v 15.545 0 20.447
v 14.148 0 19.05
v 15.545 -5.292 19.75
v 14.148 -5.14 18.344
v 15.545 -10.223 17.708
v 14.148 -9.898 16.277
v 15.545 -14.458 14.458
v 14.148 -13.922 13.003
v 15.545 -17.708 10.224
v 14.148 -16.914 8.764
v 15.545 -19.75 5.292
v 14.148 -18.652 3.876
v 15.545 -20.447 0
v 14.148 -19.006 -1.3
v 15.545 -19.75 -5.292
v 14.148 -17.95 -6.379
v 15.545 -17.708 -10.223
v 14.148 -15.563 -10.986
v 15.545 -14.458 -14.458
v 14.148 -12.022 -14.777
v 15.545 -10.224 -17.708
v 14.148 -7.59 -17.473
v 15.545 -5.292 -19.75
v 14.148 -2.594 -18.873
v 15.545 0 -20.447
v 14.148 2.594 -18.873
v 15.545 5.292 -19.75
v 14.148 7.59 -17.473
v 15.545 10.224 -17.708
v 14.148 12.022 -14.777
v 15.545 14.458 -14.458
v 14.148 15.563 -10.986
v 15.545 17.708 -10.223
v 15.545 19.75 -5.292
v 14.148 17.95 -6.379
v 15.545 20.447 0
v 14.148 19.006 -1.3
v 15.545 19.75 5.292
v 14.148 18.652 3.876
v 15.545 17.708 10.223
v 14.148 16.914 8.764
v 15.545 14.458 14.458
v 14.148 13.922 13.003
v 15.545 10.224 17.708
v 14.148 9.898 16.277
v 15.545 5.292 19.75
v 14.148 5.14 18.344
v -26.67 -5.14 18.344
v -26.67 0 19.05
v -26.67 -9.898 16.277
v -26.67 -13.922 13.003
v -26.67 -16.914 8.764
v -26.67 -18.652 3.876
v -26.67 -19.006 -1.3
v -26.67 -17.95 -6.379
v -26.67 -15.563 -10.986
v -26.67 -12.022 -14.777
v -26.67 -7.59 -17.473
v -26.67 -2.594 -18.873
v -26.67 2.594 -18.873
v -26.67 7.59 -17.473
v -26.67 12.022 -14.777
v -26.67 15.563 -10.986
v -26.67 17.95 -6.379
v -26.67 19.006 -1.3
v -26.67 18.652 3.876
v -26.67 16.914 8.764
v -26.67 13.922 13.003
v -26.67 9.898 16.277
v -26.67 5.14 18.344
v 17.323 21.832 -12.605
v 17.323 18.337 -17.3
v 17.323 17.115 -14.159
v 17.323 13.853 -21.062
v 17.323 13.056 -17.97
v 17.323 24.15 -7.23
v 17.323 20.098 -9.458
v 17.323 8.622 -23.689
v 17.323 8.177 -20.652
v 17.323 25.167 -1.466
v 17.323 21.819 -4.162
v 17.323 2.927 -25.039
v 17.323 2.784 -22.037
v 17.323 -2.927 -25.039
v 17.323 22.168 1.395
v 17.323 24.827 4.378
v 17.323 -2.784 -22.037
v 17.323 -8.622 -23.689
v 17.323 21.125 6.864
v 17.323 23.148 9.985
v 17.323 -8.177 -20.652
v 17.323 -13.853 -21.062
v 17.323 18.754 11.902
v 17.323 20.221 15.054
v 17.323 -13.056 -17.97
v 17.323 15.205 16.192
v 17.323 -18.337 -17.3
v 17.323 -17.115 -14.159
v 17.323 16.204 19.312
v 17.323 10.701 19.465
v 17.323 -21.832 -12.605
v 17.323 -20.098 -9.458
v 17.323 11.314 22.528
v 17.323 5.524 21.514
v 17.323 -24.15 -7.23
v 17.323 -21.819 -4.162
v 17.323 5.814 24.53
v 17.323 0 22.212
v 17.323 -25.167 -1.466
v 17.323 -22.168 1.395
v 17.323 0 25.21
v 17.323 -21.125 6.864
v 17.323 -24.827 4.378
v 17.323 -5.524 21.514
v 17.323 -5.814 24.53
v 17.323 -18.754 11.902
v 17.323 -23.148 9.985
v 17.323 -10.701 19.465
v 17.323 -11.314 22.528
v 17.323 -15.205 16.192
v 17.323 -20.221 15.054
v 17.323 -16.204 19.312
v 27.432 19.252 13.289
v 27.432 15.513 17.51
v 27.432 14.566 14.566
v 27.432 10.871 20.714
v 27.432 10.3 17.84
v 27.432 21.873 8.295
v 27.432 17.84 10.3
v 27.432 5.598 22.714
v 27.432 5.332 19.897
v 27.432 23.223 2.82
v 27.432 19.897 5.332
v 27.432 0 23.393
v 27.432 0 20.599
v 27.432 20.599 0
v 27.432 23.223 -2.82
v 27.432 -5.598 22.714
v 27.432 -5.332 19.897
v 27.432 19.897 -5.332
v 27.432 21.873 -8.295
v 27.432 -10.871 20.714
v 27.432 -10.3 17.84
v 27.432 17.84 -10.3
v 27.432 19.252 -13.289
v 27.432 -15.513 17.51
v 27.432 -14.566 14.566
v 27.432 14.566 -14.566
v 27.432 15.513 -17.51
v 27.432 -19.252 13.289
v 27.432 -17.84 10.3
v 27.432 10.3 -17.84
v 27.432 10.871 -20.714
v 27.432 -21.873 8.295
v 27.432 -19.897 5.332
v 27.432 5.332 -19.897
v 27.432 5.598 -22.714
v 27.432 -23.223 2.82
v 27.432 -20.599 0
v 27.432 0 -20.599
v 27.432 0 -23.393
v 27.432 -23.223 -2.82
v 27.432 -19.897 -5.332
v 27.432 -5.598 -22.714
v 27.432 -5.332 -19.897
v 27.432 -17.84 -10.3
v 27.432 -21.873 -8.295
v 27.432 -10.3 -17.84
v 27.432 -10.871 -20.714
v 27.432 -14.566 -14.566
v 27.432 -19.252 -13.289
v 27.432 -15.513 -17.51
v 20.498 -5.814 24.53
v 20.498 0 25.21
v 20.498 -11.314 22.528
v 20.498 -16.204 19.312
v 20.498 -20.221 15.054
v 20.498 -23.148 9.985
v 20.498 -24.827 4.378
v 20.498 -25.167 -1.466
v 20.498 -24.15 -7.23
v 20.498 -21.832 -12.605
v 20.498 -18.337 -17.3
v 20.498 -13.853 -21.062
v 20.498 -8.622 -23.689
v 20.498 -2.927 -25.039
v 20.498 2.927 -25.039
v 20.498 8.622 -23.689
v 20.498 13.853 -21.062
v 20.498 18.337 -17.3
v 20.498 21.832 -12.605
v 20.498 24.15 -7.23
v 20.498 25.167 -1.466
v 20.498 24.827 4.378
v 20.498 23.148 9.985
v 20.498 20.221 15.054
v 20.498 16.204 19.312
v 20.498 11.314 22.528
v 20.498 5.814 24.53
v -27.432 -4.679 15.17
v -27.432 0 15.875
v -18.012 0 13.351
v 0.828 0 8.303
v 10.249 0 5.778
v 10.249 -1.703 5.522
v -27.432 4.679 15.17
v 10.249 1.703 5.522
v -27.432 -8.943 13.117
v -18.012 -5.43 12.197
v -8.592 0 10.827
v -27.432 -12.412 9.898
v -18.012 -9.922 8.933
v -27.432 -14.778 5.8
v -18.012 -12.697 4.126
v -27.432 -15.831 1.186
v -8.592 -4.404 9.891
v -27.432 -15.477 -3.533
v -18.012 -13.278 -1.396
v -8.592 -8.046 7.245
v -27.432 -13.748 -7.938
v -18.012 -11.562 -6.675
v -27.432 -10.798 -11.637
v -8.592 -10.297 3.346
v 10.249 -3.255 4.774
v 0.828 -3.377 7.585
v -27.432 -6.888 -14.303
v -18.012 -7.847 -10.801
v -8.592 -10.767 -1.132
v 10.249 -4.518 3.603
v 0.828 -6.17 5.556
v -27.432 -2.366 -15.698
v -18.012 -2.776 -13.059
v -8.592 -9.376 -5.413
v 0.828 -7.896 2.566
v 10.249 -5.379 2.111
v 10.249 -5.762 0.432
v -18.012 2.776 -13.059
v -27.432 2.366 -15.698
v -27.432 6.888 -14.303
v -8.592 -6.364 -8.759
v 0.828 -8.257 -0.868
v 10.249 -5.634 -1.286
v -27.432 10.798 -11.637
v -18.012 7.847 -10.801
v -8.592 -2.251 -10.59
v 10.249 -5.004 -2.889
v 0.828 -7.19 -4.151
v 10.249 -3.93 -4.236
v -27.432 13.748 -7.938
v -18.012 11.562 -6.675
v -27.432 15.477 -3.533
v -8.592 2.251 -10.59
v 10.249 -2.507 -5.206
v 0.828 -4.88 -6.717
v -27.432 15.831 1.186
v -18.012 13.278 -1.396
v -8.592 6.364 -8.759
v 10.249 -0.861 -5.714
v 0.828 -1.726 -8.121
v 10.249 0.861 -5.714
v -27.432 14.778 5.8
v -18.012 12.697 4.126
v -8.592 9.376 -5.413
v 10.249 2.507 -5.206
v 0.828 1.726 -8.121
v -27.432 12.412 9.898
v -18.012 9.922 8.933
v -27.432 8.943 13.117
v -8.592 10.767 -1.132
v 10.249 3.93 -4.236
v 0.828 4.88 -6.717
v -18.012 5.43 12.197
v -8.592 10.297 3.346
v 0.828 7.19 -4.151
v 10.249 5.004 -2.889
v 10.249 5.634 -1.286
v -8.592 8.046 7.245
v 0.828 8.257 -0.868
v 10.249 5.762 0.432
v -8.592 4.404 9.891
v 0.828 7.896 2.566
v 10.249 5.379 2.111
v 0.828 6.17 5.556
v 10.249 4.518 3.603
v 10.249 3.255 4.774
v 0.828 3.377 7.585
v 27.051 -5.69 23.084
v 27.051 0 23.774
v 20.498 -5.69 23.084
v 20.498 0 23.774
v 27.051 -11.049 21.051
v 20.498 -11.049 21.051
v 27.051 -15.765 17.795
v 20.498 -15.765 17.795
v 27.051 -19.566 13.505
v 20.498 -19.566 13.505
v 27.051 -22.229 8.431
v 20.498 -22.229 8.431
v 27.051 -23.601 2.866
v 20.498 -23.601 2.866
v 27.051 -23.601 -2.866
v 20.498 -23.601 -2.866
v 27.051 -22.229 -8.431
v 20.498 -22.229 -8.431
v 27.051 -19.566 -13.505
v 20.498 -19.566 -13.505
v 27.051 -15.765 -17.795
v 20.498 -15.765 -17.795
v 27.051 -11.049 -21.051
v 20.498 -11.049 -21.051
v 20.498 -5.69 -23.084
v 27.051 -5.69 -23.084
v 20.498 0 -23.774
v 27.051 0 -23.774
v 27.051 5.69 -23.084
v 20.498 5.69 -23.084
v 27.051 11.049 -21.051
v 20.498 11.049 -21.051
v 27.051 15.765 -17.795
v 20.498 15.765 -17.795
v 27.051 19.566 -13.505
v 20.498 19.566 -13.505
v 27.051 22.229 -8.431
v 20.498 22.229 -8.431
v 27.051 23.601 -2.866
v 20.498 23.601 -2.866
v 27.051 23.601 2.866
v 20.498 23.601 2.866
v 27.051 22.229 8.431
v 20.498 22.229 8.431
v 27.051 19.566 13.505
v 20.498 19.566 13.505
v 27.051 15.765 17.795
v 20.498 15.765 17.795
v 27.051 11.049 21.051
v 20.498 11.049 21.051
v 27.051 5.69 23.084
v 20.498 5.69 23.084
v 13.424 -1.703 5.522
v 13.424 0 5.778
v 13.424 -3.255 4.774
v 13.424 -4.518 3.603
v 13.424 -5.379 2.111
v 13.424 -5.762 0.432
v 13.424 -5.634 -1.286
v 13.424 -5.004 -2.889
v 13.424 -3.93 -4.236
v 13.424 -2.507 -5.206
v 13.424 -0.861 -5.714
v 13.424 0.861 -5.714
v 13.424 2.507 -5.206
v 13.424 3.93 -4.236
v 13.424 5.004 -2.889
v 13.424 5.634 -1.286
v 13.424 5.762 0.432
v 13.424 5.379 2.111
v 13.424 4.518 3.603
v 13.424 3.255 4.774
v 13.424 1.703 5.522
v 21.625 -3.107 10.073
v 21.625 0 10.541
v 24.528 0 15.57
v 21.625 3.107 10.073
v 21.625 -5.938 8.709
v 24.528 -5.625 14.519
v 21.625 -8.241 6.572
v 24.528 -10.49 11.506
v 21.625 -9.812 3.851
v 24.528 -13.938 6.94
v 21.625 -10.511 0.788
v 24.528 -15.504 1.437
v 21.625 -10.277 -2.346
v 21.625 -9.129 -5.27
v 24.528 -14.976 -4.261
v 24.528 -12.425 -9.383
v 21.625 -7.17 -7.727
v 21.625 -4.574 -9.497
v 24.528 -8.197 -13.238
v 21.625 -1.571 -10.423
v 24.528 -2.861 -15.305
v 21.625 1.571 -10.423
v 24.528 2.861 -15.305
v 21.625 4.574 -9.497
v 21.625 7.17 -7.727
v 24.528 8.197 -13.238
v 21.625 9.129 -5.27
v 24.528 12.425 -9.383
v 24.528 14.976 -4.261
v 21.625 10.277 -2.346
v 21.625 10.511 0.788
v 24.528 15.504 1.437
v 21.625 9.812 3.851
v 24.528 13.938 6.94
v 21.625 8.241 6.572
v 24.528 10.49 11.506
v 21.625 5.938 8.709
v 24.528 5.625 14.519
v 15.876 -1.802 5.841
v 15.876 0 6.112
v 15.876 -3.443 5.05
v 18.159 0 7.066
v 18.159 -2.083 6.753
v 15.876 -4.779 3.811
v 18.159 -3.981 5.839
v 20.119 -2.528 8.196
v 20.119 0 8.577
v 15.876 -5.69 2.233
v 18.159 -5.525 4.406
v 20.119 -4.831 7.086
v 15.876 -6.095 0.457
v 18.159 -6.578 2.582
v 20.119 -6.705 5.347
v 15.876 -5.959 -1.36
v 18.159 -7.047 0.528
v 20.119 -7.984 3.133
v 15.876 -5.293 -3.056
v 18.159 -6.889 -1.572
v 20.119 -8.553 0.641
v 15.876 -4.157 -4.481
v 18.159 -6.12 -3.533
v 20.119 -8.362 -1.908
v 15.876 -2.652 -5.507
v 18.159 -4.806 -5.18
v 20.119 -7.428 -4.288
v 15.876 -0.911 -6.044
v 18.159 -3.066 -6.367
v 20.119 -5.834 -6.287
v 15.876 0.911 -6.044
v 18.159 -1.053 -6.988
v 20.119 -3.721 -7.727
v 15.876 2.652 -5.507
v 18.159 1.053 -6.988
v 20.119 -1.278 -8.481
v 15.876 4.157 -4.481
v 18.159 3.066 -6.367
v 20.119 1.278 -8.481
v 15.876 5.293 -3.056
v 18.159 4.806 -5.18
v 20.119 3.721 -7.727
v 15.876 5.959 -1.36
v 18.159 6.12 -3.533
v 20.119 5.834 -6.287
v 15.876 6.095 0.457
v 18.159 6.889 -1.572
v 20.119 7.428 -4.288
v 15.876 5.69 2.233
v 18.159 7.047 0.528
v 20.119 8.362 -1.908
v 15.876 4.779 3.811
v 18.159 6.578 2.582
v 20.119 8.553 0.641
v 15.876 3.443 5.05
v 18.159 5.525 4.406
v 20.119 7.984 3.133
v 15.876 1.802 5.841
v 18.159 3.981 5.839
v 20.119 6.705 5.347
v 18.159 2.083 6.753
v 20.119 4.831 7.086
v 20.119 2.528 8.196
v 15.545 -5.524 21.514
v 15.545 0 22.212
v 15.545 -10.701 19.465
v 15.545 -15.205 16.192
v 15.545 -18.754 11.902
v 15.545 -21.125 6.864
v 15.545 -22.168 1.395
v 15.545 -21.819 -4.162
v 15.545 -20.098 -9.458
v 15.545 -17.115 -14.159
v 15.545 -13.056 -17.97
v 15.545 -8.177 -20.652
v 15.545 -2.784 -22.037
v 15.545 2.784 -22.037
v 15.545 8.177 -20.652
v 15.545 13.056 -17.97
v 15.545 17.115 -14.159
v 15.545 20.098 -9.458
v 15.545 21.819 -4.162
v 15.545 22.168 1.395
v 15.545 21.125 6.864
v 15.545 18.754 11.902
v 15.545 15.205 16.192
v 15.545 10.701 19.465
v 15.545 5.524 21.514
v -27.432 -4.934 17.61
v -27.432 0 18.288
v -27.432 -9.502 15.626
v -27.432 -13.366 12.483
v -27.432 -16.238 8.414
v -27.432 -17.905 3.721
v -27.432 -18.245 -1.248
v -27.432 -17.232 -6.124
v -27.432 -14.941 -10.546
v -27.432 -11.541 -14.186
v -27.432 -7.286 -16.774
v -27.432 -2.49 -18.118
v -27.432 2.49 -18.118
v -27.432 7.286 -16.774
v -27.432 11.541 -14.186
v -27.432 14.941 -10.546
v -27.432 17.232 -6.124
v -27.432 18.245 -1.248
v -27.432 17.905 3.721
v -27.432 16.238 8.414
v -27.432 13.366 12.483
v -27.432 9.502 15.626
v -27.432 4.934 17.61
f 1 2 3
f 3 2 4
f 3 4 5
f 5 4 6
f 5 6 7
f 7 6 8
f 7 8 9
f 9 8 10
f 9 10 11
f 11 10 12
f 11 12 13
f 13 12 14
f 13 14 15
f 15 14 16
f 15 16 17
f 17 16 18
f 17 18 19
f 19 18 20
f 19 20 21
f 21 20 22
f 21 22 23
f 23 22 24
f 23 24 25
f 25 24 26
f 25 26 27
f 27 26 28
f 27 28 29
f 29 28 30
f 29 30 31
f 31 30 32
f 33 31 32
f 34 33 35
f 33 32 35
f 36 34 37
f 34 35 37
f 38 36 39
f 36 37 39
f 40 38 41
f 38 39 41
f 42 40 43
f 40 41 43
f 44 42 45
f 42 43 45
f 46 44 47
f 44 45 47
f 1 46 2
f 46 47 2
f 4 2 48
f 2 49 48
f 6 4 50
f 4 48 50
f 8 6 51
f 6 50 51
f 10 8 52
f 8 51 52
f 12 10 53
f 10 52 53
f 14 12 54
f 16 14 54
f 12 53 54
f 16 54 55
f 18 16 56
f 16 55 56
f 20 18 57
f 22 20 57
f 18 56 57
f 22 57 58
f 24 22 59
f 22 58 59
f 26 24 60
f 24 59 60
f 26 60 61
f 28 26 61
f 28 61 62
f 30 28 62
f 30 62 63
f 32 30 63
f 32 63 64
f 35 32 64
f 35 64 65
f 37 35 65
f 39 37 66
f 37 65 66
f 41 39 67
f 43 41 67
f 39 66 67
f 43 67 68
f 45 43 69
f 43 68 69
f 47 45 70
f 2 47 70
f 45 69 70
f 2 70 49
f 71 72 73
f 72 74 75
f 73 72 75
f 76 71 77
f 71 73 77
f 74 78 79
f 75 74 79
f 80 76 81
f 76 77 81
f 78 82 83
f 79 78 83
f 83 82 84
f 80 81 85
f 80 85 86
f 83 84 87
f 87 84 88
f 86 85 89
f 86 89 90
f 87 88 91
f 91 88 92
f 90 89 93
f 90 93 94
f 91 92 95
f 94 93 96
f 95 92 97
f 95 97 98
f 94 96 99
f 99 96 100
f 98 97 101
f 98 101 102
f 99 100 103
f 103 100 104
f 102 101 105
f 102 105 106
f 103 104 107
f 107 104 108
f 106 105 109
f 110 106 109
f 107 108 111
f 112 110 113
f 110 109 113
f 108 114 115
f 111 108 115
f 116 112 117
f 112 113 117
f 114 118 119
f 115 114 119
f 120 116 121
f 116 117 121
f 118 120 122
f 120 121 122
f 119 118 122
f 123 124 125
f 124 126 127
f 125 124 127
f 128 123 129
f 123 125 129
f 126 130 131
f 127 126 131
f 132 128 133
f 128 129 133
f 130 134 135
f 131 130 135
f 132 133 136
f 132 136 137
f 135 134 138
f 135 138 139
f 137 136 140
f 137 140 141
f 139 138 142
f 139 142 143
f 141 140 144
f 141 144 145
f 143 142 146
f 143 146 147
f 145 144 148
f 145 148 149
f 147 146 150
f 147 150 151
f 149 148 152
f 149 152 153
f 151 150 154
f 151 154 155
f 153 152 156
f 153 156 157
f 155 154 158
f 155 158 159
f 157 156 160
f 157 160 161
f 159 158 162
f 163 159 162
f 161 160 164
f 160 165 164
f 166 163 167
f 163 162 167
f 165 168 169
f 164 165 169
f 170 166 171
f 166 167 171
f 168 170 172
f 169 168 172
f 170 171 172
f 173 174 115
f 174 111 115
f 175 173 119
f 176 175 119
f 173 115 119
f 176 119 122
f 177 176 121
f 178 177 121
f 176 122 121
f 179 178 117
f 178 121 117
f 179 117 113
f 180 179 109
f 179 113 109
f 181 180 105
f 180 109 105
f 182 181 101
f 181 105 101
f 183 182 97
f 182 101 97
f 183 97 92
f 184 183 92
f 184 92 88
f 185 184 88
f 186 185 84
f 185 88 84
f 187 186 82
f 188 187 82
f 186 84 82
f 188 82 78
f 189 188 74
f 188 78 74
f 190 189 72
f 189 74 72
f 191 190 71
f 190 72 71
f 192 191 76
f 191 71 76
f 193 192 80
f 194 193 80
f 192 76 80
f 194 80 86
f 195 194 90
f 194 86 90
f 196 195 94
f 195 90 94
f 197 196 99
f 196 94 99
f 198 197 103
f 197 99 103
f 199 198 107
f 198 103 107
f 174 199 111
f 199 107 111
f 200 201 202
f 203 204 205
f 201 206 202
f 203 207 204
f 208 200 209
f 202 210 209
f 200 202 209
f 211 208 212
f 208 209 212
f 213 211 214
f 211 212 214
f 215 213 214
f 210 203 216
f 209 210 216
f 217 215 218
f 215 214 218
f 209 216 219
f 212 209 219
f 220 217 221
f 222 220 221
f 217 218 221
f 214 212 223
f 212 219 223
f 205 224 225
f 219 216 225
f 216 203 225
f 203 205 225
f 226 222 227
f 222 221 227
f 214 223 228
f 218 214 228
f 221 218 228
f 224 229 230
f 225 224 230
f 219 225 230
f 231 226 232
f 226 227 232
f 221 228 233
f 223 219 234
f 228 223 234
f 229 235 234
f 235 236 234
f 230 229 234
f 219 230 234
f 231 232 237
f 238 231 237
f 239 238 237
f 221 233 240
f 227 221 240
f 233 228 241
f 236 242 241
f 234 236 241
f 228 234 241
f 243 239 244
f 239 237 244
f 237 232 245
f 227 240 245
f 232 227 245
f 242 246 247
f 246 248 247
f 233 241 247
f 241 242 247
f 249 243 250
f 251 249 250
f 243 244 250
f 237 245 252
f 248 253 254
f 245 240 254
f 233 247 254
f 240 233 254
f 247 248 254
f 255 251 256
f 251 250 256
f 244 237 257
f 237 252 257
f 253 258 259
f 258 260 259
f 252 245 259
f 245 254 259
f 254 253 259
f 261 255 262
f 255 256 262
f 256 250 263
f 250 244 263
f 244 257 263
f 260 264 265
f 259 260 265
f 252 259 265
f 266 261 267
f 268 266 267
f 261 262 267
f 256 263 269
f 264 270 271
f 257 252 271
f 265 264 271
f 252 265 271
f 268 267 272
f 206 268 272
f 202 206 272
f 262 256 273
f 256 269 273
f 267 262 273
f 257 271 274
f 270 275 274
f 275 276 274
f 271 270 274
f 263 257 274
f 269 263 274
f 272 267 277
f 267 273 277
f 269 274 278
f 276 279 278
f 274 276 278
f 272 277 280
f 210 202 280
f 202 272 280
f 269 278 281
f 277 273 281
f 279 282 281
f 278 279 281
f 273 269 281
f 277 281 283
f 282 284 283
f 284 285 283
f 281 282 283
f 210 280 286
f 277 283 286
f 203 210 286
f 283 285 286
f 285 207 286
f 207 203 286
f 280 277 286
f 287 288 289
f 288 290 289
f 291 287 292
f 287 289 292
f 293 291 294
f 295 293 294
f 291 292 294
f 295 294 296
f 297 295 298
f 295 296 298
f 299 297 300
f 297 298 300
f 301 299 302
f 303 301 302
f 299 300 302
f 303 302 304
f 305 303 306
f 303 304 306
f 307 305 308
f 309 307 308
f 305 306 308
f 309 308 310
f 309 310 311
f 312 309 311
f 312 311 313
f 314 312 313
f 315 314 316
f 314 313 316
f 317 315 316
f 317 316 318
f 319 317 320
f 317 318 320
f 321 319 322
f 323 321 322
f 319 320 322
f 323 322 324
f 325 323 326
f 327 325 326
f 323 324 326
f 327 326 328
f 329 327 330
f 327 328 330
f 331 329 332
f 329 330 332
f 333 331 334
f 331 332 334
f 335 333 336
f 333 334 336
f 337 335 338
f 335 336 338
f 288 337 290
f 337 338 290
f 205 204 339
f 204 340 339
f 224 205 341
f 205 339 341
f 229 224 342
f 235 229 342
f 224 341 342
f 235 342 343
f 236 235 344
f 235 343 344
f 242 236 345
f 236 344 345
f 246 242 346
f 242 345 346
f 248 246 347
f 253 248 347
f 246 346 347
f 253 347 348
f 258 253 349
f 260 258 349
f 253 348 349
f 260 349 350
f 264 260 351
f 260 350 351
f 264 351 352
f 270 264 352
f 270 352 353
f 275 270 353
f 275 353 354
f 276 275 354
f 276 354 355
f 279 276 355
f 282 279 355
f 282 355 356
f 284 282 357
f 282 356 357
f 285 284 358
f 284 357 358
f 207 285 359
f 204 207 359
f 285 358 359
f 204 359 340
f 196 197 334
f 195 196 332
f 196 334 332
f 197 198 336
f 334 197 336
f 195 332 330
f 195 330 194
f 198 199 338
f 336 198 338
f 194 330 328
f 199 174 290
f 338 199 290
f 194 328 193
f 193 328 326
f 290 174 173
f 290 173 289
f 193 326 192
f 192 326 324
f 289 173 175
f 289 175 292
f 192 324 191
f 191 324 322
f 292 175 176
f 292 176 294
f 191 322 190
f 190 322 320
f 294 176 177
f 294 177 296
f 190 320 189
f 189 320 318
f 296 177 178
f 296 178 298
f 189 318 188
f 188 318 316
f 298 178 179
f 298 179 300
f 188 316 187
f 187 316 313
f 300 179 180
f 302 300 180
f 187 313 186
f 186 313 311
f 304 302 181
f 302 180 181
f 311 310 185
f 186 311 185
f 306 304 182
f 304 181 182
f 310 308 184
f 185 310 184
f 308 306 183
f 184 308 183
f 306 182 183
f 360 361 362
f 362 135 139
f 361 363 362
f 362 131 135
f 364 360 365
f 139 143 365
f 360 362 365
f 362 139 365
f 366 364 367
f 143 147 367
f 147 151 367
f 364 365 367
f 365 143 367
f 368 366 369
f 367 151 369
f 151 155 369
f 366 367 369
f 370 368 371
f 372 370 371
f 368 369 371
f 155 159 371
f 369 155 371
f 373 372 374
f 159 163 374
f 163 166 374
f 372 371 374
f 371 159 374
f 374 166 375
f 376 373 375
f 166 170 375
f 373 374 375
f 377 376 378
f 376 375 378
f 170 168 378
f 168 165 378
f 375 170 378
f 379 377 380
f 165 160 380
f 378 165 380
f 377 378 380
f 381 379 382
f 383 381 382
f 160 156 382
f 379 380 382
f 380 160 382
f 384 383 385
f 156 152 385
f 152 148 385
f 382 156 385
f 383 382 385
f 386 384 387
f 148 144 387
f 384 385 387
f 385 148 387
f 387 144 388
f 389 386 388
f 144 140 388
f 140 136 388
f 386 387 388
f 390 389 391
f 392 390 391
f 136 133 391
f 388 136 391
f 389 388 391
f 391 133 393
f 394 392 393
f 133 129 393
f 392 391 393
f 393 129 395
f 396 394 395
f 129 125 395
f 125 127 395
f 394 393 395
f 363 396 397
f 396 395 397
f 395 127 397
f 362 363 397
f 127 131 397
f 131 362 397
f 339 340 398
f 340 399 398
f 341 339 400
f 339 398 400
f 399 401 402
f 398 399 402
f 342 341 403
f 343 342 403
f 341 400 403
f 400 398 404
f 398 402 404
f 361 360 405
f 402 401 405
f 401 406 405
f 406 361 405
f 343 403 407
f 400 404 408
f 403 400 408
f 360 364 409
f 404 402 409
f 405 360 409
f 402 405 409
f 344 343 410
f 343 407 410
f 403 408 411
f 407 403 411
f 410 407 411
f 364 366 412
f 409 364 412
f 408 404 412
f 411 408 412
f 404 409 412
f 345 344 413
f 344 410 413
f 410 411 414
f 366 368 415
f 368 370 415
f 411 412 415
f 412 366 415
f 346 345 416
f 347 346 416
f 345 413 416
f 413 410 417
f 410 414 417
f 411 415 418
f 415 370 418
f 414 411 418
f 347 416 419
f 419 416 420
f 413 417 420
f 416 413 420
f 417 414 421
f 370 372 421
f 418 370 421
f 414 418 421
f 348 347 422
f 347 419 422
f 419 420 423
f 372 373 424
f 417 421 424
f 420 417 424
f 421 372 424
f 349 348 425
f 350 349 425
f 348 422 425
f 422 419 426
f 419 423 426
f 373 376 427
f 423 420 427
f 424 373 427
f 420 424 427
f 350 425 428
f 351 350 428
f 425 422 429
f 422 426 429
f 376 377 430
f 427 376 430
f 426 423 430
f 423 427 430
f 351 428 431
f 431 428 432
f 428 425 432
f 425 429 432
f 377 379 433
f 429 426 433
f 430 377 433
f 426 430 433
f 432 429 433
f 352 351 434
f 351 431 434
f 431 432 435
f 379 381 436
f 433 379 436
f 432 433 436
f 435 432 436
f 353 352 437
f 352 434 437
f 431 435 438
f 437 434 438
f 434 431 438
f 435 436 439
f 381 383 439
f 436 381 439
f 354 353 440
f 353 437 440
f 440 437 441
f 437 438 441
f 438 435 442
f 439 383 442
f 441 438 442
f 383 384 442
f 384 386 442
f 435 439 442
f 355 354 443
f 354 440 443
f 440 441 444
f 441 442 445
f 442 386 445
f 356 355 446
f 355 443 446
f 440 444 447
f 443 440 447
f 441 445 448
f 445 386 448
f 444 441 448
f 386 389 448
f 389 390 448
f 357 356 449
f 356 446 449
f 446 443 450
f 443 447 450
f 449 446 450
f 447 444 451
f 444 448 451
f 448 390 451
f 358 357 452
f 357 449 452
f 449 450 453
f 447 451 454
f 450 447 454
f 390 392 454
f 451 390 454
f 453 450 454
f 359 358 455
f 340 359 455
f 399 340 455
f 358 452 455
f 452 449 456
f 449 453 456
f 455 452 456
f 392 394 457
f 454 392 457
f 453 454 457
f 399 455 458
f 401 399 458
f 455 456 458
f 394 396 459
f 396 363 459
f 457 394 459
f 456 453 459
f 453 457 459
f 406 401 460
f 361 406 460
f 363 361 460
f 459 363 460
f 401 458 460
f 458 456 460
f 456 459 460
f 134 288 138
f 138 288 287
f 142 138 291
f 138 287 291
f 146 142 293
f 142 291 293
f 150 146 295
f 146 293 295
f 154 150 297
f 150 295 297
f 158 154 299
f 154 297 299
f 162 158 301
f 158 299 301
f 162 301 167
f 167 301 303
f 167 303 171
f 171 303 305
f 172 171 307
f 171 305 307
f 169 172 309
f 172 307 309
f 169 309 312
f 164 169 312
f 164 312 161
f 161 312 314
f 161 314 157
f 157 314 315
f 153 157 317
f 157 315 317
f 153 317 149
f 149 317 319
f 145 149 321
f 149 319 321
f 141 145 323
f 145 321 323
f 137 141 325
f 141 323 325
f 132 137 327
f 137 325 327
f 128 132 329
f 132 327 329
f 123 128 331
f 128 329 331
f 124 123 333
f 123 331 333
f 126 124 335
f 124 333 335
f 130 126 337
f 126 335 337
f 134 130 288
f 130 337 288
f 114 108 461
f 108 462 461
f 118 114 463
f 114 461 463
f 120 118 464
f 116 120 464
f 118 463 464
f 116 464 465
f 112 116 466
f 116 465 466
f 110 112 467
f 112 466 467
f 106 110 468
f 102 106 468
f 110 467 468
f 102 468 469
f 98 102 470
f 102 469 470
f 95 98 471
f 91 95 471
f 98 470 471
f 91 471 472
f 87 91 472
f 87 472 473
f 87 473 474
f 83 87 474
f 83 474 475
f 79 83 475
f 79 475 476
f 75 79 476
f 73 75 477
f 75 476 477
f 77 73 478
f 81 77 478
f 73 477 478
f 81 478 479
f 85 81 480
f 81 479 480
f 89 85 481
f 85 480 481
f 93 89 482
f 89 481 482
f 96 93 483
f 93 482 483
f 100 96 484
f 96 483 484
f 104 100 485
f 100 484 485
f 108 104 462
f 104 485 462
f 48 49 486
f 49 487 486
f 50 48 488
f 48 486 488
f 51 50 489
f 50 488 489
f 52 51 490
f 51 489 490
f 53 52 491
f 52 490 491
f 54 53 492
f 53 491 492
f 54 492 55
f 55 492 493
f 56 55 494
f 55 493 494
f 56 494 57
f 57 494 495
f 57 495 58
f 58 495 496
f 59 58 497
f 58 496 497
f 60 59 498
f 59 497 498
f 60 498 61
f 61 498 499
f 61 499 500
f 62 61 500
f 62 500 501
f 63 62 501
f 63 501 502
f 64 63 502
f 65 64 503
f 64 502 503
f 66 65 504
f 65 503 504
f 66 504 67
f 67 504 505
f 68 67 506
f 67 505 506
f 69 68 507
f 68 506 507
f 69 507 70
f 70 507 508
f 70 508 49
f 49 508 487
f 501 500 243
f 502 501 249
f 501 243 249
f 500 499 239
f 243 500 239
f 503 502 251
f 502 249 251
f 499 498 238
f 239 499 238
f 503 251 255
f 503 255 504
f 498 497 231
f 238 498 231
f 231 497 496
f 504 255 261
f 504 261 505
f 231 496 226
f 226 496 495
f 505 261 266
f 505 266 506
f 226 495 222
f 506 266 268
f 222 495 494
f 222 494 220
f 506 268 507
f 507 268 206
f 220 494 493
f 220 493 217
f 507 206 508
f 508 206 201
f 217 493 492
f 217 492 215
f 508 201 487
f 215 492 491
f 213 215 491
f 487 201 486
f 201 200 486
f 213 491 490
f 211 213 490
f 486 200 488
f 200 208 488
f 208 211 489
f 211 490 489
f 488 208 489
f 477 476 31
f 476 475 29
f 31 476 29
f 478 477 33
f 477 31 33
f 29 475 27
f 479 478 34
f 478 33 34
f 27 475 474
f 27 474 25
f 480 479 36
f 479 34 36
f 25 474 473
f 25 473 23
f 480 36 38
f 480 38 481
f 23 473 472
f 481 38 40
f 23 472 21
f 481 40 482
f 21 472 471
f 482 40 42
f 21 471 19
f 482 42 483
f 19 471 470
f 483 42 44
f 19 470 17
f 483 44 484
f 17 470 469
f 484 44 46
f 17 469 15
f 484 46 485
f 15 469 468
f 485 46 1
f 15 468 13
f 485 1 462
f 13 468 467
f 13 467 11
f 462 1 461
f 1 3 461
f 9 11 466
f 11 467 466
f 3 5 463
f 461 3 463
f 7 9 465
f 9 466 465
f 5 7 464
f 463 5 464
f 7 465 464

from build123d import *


with BuildPart() as part:
    # Sketch1 → Revolve1 (revolve)
    with BuildSketch(Plane.XY, mode=Mode.PRIVATE) as revolve1_sk:
        with BuildLine():
            Line((-27.432, 15.875), (10.248650979, 5.7785))
            Line((10.248650979, 5.7785), (13.423650979, 5.7785))
            ThreePointArc((13.423650979, 5.7785), (18.15901576, 7.066472027), (21.624710712, 10.540879898))
            Line((21.624710712, 10.540879898), (27.432, 20.5994))
            Line((27.432, 20.5994), (27.432, 23.3934))
            Line((27.432, 23.3934), (27.051, 23.7744))
            Line((27.051, 23.7744), (20.4978, 23.7744))
            Line((20.4978, 23.7744), (20.4978, 25.2095))
            Line((20.4978, 25.2095), (17.3228, 25.2095))
            Line((17.3228, 25.2095), (17.3228, 22.2123))
            Line((17.3228, 22.2123), (15.5448, 22.2123))
            Line((15.5448, 22.2123), (15.5448, 20.447))
            Line((15.5448, 20.447), (14.1478, 19.05))
            Line((14.1478, 19.05), (-26.67, 19.05))
            Line((-26.67, 19.05), (-27.432, 18.288))
            Line((-27.432, 18.288), (-27.432, 15.875))
        make_face()
    revolve(revolve1_sk.sketch.rotate(Axis((-39.917319276, 0, 0), (1, 0, 0)), 90), axis=Axis((-39.917319276, 0, 0), (1, 0, 0)))


solid = part.part
